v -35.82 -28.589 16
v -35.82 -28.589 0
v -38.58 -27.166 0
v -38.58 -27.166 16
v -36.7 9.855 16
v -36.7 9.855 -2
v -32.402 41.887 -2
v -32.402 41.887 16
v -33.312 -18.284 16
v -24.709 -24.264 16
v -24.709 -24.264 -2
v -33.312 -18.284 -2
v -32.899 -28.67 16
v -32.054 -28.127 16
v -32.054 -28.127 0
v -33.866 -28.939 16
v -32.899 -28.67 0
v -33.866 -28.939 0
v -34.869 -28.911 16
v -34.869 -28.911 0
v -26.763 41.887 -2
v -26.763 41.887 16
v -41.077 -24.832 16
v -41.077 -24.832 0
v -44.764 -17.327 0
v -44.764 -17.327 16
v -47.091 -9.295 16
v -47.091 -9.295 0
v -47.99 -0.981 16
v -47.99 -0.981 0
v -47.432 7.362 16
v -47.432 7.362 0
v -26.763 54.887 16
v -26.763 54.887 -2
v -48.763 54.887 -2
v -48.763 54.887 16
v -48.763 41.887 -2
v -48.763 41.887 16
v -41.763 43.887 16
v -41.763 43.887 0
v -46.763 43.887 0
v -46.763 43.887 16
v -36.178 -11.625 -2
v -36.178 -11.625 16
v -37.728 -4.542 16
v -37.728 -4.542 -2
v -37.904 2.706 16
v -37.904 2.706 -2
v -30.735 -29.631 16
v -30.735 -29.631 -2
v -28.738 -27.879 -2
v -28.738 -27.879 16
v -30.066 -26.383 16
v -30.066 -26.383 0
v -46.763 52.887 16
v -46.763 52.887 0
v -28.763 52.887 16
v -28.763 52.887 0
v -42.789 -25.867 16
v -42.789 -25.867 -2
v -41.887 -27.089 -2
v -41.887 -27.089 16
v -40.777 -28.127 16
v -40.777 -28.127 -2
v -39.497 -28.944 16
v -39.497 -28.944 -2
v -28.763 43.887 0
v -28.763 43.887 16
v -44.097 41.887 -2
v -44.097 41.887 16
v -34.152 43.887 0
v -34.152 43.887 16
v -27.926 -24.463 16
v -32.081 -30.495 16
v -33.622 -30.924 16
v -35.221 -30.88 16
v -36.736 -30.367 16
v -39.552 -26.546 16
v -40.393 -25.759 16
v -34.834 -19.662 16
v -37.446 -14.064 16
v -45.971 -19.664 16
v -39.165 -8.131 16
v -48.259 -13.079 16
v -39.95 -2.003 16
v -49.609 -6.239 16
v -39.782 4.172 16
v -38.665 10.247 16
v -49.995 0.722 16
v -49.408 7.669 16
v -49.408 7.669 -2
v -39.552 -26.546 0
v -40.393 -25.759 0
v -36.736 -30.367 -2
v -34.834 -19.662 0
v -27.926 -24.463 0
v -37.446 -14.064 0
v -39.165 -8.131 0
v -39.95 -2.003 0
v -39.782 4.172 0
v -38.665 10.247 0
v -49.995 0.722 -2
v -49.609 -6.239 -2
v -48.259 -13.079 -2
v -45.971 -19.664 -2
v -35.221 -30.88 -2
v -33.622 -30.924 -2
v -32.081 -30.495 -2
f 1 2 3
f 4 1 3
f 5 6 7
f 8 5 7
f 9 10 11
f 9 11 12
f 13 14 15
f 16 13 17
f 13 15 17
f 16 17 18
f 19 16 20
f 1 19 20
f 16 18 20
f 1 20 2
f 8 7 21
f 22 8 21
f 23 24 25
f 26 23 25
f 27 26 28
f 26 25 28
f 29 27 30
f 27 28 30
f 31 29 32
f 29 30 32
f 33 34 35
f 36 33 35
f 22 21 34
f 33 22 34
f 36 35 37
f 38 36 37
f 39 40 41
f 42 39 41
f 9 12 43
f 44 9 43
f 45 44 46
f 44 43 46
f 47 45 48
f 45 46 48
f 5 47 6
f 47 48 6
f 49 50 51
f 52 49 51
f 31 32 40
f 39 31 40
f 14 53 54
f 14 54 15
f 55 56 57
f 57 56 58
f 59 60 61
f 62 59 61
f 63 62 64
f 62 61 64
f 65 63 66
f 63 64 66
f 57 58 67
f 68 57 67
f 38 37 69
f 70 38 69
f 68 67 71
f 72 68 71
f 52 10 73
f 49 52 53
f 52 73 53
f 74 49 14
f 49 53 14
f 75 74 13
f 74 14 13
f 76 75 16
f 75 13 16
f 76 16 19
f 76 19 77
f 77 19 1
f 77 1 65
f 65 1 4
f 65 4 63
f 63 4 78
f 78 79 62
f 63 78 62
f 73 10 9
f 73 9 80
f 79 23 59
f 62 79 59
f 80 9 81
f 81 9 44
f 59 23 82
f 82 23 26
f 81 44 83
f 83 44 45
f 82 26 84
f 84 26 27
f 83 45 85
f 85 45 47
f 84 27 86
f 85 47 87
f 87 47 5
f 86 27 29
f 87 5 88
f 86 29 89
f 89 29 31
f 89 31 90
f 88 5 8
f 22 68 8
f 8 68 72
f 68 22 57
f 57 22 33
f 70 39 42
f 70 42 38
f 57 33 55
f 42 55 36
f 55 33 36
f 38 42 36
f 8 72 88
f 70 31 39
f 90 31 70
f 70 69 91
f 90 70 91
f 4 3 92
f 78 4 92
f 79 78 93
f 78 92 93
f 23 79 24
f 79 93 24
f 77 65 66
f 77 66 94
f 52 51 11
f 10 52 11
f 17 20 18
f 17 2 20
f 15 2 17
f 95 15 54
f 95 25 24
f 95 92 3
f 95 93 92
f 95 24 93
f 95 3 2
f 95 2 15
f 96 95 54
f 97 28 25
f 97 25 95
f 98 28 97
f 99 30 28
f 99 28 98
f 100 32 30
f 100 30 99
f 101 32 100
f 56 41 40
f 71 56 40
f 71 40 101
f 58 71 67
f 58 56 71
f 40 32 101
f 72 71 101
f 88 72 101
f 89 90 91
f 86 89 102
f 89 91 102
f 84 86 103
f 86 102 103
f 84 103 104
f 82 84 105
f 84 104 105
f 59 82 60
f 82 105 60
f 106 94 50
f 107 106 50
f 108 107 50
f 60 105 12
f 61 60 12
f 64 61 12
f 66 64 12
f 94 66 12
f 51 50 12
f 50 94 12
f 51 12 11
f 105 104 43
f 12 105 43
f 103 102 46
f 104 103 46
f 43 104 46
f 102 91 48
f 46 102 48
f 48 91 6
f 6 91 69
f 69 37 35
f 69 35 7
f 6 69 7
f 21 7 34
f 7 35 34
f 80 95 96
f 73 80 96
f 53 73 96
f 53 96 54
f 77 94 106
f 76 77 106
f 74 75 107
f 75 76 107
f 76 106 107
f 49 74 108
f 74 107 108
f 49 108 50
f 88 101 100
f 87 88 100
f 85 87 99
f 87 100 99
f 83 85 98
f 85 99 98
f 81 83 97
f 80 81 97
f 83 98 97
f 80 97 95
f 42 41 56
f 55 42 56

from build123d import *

# Parameters (mm, degrees)
EXTRUDE_1_DEPTH = 16
EXTRUDE_START   = 2
EXTRUDE_2_DEPTH = 2


with BuildPart() as part:
    # 草图2 → 凸台-拉伸1 (new body)
    with BuildSketch(Plane.XY):
        with BuildLine():
            Line((-48.762908832, 54.887448723), (-26.762908832, 54.887448723))
            Line((-26.762908832, 54.887448723), (-26.762908832, 41.887448723))
            Line((-26.762908832, 41.887448723), (-32.402449776, 41.887448723))
            Line((-32.402449776, 41.887448723), (-36.699855568, 9.854978503))
            ThreePointArc((-36.699855568, 9.854978503), (-37.727531794, -4.542394165), (-33.311876123, -18.284389767))
            Line((-33.311876123, -18.284389767), (-24.708766903, -24.263803058))
            Line((-24.708766903, -24.263803058), (-28.738435498, -27.878766712))
            Line((-28.738435498, -27.878766712), (-30.734862705, -29.630628791))
            ThreePointArc((-30.734862705, -29.630628791), (-33.621940029, -30.923968409), (-36.736058642, -30.367005118))
            Line((-36.736058642, -30.367005118), (-39.496815638, -28.94354271))
            ThreePointArc((-39.496815638, -28.94354271), (-41.356176764, -27.633440822), (-42.78903224, -25.866942609))
            ThreePointArc((-42.78903224, -25.866942609), (-49.053565639, -9.682339493), (-49.408404924, 7.668736722))
            Line((-49.408404924, 7.668736722), (-44.097278331, 41.887448723))
            Line((-44.097278331, 41.887448723), (-48.762908832, 41.887448723))
            Line((-48.762908832, 41.887448723), (-48.762908832, 54.887448723))
        make_face()
        with BuildLine():
            Line((-30.065808903, -26.382705226), (-32.053997966, -28.127338346))
            ThreePointArc((-32.053997966, -28.127338346), (-33.865522987, -28.938856991), (-35.819507294, -28.589384904))
            Line((-35.819507294, -28.589384904), (-38.580264289, -27.165922497))
            ThreePointArc((-38.580264289, -27.165922497), (-39.990623798, -26.172186191), (-41.077470951, -24.832264904))
            ThreePointArc((-41.077470951, -24.832264904), (-47.091423014, -9.295045913), (-47.432068727, 7.361987253))
            Line((-47.432068727, 7.361987253), (-41.762908832, 43.887448723))
            Line((-41.762908832, 43.887448723), (-46.762908832, 43.887448723))
            Line((-46.762908832, 43.887448723), (-46.762908832, 52.887448723))
            Line((-46.762908832, 52.887448723), (-28.762908832, 52.887448723))
            Line((-28.762908832, 52.887448723), (-28.762908832, 43.887448723))
            Line((-28.762908832, 43.887448723), (-34.152052224, 43.887448723))
            Line((-34.152052224, 43.887448723), (-38.66514404, 10.247274583))
            ThreePointArc((-38.66514404, 10.247274583), (-39.67581399, -5.082301073), (-34.833871303, -19.66218223))
            Line((-34.833871303, -19.66218223), (-27.926153972, -24.463248422))
            Line((-27.926153972, -24.463248422), (-30.065808903, -26.382705226))
        make_face(mode=Mode.SUBTRACT)
    extrude(amount=EXTRUDE_1_DEPTH)

    # 草图3 → 凸台-拉伸2 (add)
    with BuildSketch(Plane(origin=(0, 0, 0), x_dir=(-1, 0, 0), z_dir=(0, 0, -1)).offset(EXTRUDE_START)):
        with BuildLine():
            Line((24.708766903, -24.263803058), (33.311876123, -18.284389767))
            ThreePointArc((33.311876123, -18.284389767), (37.727531794, -4.542394165), (36.699855568, 9.854978503))
            Line((36.699855568, 9.854978503), (32.402449776, 41.887448723))
            Line((32.402449776, 41.887448723), (26.762908832, 41.887448723))
            Line((26.762908832, 41.887448723), (26.762908832, 54.887448723))
            Line((26.762908832, 54.887448723), (48.762908832, 54.887448723))
            Line((48.762908832, 54.887448723), (48.762908832, 41.887448723))
            Line((48.762908832, 41.887448723), (44.097278331, 41.887448723))
            Line((44.097278331, 41.887448723), (49.408404924, 7.668736722))
            ThreePointArc((49.408404924, 7.668736722), (49.053565639, -9.682339493), (42.78903224, -25.866942609))
            ThreePointArc((42.78903224, -25.866942609), (41.356176764, -27.633440822), (39.496815638, -28.94354271))
            Line((39.496815638, -28.94354271), (36.736058642, -30.367005118))
            ThreePointArc((36.736058642, -30.367005118), (33.621940029, -30.923968409), (30.734862705, -29.630628791))
            Line((30.734862705, -29.630628791), (28.738435498, -27.878766712))
            Line((28.738435498, -27.878766712), (24.708766903, -24.263803058))
        make_face()
    extrude(amount=-EXTRUDE_2_DEPTH)


solid = part.part
